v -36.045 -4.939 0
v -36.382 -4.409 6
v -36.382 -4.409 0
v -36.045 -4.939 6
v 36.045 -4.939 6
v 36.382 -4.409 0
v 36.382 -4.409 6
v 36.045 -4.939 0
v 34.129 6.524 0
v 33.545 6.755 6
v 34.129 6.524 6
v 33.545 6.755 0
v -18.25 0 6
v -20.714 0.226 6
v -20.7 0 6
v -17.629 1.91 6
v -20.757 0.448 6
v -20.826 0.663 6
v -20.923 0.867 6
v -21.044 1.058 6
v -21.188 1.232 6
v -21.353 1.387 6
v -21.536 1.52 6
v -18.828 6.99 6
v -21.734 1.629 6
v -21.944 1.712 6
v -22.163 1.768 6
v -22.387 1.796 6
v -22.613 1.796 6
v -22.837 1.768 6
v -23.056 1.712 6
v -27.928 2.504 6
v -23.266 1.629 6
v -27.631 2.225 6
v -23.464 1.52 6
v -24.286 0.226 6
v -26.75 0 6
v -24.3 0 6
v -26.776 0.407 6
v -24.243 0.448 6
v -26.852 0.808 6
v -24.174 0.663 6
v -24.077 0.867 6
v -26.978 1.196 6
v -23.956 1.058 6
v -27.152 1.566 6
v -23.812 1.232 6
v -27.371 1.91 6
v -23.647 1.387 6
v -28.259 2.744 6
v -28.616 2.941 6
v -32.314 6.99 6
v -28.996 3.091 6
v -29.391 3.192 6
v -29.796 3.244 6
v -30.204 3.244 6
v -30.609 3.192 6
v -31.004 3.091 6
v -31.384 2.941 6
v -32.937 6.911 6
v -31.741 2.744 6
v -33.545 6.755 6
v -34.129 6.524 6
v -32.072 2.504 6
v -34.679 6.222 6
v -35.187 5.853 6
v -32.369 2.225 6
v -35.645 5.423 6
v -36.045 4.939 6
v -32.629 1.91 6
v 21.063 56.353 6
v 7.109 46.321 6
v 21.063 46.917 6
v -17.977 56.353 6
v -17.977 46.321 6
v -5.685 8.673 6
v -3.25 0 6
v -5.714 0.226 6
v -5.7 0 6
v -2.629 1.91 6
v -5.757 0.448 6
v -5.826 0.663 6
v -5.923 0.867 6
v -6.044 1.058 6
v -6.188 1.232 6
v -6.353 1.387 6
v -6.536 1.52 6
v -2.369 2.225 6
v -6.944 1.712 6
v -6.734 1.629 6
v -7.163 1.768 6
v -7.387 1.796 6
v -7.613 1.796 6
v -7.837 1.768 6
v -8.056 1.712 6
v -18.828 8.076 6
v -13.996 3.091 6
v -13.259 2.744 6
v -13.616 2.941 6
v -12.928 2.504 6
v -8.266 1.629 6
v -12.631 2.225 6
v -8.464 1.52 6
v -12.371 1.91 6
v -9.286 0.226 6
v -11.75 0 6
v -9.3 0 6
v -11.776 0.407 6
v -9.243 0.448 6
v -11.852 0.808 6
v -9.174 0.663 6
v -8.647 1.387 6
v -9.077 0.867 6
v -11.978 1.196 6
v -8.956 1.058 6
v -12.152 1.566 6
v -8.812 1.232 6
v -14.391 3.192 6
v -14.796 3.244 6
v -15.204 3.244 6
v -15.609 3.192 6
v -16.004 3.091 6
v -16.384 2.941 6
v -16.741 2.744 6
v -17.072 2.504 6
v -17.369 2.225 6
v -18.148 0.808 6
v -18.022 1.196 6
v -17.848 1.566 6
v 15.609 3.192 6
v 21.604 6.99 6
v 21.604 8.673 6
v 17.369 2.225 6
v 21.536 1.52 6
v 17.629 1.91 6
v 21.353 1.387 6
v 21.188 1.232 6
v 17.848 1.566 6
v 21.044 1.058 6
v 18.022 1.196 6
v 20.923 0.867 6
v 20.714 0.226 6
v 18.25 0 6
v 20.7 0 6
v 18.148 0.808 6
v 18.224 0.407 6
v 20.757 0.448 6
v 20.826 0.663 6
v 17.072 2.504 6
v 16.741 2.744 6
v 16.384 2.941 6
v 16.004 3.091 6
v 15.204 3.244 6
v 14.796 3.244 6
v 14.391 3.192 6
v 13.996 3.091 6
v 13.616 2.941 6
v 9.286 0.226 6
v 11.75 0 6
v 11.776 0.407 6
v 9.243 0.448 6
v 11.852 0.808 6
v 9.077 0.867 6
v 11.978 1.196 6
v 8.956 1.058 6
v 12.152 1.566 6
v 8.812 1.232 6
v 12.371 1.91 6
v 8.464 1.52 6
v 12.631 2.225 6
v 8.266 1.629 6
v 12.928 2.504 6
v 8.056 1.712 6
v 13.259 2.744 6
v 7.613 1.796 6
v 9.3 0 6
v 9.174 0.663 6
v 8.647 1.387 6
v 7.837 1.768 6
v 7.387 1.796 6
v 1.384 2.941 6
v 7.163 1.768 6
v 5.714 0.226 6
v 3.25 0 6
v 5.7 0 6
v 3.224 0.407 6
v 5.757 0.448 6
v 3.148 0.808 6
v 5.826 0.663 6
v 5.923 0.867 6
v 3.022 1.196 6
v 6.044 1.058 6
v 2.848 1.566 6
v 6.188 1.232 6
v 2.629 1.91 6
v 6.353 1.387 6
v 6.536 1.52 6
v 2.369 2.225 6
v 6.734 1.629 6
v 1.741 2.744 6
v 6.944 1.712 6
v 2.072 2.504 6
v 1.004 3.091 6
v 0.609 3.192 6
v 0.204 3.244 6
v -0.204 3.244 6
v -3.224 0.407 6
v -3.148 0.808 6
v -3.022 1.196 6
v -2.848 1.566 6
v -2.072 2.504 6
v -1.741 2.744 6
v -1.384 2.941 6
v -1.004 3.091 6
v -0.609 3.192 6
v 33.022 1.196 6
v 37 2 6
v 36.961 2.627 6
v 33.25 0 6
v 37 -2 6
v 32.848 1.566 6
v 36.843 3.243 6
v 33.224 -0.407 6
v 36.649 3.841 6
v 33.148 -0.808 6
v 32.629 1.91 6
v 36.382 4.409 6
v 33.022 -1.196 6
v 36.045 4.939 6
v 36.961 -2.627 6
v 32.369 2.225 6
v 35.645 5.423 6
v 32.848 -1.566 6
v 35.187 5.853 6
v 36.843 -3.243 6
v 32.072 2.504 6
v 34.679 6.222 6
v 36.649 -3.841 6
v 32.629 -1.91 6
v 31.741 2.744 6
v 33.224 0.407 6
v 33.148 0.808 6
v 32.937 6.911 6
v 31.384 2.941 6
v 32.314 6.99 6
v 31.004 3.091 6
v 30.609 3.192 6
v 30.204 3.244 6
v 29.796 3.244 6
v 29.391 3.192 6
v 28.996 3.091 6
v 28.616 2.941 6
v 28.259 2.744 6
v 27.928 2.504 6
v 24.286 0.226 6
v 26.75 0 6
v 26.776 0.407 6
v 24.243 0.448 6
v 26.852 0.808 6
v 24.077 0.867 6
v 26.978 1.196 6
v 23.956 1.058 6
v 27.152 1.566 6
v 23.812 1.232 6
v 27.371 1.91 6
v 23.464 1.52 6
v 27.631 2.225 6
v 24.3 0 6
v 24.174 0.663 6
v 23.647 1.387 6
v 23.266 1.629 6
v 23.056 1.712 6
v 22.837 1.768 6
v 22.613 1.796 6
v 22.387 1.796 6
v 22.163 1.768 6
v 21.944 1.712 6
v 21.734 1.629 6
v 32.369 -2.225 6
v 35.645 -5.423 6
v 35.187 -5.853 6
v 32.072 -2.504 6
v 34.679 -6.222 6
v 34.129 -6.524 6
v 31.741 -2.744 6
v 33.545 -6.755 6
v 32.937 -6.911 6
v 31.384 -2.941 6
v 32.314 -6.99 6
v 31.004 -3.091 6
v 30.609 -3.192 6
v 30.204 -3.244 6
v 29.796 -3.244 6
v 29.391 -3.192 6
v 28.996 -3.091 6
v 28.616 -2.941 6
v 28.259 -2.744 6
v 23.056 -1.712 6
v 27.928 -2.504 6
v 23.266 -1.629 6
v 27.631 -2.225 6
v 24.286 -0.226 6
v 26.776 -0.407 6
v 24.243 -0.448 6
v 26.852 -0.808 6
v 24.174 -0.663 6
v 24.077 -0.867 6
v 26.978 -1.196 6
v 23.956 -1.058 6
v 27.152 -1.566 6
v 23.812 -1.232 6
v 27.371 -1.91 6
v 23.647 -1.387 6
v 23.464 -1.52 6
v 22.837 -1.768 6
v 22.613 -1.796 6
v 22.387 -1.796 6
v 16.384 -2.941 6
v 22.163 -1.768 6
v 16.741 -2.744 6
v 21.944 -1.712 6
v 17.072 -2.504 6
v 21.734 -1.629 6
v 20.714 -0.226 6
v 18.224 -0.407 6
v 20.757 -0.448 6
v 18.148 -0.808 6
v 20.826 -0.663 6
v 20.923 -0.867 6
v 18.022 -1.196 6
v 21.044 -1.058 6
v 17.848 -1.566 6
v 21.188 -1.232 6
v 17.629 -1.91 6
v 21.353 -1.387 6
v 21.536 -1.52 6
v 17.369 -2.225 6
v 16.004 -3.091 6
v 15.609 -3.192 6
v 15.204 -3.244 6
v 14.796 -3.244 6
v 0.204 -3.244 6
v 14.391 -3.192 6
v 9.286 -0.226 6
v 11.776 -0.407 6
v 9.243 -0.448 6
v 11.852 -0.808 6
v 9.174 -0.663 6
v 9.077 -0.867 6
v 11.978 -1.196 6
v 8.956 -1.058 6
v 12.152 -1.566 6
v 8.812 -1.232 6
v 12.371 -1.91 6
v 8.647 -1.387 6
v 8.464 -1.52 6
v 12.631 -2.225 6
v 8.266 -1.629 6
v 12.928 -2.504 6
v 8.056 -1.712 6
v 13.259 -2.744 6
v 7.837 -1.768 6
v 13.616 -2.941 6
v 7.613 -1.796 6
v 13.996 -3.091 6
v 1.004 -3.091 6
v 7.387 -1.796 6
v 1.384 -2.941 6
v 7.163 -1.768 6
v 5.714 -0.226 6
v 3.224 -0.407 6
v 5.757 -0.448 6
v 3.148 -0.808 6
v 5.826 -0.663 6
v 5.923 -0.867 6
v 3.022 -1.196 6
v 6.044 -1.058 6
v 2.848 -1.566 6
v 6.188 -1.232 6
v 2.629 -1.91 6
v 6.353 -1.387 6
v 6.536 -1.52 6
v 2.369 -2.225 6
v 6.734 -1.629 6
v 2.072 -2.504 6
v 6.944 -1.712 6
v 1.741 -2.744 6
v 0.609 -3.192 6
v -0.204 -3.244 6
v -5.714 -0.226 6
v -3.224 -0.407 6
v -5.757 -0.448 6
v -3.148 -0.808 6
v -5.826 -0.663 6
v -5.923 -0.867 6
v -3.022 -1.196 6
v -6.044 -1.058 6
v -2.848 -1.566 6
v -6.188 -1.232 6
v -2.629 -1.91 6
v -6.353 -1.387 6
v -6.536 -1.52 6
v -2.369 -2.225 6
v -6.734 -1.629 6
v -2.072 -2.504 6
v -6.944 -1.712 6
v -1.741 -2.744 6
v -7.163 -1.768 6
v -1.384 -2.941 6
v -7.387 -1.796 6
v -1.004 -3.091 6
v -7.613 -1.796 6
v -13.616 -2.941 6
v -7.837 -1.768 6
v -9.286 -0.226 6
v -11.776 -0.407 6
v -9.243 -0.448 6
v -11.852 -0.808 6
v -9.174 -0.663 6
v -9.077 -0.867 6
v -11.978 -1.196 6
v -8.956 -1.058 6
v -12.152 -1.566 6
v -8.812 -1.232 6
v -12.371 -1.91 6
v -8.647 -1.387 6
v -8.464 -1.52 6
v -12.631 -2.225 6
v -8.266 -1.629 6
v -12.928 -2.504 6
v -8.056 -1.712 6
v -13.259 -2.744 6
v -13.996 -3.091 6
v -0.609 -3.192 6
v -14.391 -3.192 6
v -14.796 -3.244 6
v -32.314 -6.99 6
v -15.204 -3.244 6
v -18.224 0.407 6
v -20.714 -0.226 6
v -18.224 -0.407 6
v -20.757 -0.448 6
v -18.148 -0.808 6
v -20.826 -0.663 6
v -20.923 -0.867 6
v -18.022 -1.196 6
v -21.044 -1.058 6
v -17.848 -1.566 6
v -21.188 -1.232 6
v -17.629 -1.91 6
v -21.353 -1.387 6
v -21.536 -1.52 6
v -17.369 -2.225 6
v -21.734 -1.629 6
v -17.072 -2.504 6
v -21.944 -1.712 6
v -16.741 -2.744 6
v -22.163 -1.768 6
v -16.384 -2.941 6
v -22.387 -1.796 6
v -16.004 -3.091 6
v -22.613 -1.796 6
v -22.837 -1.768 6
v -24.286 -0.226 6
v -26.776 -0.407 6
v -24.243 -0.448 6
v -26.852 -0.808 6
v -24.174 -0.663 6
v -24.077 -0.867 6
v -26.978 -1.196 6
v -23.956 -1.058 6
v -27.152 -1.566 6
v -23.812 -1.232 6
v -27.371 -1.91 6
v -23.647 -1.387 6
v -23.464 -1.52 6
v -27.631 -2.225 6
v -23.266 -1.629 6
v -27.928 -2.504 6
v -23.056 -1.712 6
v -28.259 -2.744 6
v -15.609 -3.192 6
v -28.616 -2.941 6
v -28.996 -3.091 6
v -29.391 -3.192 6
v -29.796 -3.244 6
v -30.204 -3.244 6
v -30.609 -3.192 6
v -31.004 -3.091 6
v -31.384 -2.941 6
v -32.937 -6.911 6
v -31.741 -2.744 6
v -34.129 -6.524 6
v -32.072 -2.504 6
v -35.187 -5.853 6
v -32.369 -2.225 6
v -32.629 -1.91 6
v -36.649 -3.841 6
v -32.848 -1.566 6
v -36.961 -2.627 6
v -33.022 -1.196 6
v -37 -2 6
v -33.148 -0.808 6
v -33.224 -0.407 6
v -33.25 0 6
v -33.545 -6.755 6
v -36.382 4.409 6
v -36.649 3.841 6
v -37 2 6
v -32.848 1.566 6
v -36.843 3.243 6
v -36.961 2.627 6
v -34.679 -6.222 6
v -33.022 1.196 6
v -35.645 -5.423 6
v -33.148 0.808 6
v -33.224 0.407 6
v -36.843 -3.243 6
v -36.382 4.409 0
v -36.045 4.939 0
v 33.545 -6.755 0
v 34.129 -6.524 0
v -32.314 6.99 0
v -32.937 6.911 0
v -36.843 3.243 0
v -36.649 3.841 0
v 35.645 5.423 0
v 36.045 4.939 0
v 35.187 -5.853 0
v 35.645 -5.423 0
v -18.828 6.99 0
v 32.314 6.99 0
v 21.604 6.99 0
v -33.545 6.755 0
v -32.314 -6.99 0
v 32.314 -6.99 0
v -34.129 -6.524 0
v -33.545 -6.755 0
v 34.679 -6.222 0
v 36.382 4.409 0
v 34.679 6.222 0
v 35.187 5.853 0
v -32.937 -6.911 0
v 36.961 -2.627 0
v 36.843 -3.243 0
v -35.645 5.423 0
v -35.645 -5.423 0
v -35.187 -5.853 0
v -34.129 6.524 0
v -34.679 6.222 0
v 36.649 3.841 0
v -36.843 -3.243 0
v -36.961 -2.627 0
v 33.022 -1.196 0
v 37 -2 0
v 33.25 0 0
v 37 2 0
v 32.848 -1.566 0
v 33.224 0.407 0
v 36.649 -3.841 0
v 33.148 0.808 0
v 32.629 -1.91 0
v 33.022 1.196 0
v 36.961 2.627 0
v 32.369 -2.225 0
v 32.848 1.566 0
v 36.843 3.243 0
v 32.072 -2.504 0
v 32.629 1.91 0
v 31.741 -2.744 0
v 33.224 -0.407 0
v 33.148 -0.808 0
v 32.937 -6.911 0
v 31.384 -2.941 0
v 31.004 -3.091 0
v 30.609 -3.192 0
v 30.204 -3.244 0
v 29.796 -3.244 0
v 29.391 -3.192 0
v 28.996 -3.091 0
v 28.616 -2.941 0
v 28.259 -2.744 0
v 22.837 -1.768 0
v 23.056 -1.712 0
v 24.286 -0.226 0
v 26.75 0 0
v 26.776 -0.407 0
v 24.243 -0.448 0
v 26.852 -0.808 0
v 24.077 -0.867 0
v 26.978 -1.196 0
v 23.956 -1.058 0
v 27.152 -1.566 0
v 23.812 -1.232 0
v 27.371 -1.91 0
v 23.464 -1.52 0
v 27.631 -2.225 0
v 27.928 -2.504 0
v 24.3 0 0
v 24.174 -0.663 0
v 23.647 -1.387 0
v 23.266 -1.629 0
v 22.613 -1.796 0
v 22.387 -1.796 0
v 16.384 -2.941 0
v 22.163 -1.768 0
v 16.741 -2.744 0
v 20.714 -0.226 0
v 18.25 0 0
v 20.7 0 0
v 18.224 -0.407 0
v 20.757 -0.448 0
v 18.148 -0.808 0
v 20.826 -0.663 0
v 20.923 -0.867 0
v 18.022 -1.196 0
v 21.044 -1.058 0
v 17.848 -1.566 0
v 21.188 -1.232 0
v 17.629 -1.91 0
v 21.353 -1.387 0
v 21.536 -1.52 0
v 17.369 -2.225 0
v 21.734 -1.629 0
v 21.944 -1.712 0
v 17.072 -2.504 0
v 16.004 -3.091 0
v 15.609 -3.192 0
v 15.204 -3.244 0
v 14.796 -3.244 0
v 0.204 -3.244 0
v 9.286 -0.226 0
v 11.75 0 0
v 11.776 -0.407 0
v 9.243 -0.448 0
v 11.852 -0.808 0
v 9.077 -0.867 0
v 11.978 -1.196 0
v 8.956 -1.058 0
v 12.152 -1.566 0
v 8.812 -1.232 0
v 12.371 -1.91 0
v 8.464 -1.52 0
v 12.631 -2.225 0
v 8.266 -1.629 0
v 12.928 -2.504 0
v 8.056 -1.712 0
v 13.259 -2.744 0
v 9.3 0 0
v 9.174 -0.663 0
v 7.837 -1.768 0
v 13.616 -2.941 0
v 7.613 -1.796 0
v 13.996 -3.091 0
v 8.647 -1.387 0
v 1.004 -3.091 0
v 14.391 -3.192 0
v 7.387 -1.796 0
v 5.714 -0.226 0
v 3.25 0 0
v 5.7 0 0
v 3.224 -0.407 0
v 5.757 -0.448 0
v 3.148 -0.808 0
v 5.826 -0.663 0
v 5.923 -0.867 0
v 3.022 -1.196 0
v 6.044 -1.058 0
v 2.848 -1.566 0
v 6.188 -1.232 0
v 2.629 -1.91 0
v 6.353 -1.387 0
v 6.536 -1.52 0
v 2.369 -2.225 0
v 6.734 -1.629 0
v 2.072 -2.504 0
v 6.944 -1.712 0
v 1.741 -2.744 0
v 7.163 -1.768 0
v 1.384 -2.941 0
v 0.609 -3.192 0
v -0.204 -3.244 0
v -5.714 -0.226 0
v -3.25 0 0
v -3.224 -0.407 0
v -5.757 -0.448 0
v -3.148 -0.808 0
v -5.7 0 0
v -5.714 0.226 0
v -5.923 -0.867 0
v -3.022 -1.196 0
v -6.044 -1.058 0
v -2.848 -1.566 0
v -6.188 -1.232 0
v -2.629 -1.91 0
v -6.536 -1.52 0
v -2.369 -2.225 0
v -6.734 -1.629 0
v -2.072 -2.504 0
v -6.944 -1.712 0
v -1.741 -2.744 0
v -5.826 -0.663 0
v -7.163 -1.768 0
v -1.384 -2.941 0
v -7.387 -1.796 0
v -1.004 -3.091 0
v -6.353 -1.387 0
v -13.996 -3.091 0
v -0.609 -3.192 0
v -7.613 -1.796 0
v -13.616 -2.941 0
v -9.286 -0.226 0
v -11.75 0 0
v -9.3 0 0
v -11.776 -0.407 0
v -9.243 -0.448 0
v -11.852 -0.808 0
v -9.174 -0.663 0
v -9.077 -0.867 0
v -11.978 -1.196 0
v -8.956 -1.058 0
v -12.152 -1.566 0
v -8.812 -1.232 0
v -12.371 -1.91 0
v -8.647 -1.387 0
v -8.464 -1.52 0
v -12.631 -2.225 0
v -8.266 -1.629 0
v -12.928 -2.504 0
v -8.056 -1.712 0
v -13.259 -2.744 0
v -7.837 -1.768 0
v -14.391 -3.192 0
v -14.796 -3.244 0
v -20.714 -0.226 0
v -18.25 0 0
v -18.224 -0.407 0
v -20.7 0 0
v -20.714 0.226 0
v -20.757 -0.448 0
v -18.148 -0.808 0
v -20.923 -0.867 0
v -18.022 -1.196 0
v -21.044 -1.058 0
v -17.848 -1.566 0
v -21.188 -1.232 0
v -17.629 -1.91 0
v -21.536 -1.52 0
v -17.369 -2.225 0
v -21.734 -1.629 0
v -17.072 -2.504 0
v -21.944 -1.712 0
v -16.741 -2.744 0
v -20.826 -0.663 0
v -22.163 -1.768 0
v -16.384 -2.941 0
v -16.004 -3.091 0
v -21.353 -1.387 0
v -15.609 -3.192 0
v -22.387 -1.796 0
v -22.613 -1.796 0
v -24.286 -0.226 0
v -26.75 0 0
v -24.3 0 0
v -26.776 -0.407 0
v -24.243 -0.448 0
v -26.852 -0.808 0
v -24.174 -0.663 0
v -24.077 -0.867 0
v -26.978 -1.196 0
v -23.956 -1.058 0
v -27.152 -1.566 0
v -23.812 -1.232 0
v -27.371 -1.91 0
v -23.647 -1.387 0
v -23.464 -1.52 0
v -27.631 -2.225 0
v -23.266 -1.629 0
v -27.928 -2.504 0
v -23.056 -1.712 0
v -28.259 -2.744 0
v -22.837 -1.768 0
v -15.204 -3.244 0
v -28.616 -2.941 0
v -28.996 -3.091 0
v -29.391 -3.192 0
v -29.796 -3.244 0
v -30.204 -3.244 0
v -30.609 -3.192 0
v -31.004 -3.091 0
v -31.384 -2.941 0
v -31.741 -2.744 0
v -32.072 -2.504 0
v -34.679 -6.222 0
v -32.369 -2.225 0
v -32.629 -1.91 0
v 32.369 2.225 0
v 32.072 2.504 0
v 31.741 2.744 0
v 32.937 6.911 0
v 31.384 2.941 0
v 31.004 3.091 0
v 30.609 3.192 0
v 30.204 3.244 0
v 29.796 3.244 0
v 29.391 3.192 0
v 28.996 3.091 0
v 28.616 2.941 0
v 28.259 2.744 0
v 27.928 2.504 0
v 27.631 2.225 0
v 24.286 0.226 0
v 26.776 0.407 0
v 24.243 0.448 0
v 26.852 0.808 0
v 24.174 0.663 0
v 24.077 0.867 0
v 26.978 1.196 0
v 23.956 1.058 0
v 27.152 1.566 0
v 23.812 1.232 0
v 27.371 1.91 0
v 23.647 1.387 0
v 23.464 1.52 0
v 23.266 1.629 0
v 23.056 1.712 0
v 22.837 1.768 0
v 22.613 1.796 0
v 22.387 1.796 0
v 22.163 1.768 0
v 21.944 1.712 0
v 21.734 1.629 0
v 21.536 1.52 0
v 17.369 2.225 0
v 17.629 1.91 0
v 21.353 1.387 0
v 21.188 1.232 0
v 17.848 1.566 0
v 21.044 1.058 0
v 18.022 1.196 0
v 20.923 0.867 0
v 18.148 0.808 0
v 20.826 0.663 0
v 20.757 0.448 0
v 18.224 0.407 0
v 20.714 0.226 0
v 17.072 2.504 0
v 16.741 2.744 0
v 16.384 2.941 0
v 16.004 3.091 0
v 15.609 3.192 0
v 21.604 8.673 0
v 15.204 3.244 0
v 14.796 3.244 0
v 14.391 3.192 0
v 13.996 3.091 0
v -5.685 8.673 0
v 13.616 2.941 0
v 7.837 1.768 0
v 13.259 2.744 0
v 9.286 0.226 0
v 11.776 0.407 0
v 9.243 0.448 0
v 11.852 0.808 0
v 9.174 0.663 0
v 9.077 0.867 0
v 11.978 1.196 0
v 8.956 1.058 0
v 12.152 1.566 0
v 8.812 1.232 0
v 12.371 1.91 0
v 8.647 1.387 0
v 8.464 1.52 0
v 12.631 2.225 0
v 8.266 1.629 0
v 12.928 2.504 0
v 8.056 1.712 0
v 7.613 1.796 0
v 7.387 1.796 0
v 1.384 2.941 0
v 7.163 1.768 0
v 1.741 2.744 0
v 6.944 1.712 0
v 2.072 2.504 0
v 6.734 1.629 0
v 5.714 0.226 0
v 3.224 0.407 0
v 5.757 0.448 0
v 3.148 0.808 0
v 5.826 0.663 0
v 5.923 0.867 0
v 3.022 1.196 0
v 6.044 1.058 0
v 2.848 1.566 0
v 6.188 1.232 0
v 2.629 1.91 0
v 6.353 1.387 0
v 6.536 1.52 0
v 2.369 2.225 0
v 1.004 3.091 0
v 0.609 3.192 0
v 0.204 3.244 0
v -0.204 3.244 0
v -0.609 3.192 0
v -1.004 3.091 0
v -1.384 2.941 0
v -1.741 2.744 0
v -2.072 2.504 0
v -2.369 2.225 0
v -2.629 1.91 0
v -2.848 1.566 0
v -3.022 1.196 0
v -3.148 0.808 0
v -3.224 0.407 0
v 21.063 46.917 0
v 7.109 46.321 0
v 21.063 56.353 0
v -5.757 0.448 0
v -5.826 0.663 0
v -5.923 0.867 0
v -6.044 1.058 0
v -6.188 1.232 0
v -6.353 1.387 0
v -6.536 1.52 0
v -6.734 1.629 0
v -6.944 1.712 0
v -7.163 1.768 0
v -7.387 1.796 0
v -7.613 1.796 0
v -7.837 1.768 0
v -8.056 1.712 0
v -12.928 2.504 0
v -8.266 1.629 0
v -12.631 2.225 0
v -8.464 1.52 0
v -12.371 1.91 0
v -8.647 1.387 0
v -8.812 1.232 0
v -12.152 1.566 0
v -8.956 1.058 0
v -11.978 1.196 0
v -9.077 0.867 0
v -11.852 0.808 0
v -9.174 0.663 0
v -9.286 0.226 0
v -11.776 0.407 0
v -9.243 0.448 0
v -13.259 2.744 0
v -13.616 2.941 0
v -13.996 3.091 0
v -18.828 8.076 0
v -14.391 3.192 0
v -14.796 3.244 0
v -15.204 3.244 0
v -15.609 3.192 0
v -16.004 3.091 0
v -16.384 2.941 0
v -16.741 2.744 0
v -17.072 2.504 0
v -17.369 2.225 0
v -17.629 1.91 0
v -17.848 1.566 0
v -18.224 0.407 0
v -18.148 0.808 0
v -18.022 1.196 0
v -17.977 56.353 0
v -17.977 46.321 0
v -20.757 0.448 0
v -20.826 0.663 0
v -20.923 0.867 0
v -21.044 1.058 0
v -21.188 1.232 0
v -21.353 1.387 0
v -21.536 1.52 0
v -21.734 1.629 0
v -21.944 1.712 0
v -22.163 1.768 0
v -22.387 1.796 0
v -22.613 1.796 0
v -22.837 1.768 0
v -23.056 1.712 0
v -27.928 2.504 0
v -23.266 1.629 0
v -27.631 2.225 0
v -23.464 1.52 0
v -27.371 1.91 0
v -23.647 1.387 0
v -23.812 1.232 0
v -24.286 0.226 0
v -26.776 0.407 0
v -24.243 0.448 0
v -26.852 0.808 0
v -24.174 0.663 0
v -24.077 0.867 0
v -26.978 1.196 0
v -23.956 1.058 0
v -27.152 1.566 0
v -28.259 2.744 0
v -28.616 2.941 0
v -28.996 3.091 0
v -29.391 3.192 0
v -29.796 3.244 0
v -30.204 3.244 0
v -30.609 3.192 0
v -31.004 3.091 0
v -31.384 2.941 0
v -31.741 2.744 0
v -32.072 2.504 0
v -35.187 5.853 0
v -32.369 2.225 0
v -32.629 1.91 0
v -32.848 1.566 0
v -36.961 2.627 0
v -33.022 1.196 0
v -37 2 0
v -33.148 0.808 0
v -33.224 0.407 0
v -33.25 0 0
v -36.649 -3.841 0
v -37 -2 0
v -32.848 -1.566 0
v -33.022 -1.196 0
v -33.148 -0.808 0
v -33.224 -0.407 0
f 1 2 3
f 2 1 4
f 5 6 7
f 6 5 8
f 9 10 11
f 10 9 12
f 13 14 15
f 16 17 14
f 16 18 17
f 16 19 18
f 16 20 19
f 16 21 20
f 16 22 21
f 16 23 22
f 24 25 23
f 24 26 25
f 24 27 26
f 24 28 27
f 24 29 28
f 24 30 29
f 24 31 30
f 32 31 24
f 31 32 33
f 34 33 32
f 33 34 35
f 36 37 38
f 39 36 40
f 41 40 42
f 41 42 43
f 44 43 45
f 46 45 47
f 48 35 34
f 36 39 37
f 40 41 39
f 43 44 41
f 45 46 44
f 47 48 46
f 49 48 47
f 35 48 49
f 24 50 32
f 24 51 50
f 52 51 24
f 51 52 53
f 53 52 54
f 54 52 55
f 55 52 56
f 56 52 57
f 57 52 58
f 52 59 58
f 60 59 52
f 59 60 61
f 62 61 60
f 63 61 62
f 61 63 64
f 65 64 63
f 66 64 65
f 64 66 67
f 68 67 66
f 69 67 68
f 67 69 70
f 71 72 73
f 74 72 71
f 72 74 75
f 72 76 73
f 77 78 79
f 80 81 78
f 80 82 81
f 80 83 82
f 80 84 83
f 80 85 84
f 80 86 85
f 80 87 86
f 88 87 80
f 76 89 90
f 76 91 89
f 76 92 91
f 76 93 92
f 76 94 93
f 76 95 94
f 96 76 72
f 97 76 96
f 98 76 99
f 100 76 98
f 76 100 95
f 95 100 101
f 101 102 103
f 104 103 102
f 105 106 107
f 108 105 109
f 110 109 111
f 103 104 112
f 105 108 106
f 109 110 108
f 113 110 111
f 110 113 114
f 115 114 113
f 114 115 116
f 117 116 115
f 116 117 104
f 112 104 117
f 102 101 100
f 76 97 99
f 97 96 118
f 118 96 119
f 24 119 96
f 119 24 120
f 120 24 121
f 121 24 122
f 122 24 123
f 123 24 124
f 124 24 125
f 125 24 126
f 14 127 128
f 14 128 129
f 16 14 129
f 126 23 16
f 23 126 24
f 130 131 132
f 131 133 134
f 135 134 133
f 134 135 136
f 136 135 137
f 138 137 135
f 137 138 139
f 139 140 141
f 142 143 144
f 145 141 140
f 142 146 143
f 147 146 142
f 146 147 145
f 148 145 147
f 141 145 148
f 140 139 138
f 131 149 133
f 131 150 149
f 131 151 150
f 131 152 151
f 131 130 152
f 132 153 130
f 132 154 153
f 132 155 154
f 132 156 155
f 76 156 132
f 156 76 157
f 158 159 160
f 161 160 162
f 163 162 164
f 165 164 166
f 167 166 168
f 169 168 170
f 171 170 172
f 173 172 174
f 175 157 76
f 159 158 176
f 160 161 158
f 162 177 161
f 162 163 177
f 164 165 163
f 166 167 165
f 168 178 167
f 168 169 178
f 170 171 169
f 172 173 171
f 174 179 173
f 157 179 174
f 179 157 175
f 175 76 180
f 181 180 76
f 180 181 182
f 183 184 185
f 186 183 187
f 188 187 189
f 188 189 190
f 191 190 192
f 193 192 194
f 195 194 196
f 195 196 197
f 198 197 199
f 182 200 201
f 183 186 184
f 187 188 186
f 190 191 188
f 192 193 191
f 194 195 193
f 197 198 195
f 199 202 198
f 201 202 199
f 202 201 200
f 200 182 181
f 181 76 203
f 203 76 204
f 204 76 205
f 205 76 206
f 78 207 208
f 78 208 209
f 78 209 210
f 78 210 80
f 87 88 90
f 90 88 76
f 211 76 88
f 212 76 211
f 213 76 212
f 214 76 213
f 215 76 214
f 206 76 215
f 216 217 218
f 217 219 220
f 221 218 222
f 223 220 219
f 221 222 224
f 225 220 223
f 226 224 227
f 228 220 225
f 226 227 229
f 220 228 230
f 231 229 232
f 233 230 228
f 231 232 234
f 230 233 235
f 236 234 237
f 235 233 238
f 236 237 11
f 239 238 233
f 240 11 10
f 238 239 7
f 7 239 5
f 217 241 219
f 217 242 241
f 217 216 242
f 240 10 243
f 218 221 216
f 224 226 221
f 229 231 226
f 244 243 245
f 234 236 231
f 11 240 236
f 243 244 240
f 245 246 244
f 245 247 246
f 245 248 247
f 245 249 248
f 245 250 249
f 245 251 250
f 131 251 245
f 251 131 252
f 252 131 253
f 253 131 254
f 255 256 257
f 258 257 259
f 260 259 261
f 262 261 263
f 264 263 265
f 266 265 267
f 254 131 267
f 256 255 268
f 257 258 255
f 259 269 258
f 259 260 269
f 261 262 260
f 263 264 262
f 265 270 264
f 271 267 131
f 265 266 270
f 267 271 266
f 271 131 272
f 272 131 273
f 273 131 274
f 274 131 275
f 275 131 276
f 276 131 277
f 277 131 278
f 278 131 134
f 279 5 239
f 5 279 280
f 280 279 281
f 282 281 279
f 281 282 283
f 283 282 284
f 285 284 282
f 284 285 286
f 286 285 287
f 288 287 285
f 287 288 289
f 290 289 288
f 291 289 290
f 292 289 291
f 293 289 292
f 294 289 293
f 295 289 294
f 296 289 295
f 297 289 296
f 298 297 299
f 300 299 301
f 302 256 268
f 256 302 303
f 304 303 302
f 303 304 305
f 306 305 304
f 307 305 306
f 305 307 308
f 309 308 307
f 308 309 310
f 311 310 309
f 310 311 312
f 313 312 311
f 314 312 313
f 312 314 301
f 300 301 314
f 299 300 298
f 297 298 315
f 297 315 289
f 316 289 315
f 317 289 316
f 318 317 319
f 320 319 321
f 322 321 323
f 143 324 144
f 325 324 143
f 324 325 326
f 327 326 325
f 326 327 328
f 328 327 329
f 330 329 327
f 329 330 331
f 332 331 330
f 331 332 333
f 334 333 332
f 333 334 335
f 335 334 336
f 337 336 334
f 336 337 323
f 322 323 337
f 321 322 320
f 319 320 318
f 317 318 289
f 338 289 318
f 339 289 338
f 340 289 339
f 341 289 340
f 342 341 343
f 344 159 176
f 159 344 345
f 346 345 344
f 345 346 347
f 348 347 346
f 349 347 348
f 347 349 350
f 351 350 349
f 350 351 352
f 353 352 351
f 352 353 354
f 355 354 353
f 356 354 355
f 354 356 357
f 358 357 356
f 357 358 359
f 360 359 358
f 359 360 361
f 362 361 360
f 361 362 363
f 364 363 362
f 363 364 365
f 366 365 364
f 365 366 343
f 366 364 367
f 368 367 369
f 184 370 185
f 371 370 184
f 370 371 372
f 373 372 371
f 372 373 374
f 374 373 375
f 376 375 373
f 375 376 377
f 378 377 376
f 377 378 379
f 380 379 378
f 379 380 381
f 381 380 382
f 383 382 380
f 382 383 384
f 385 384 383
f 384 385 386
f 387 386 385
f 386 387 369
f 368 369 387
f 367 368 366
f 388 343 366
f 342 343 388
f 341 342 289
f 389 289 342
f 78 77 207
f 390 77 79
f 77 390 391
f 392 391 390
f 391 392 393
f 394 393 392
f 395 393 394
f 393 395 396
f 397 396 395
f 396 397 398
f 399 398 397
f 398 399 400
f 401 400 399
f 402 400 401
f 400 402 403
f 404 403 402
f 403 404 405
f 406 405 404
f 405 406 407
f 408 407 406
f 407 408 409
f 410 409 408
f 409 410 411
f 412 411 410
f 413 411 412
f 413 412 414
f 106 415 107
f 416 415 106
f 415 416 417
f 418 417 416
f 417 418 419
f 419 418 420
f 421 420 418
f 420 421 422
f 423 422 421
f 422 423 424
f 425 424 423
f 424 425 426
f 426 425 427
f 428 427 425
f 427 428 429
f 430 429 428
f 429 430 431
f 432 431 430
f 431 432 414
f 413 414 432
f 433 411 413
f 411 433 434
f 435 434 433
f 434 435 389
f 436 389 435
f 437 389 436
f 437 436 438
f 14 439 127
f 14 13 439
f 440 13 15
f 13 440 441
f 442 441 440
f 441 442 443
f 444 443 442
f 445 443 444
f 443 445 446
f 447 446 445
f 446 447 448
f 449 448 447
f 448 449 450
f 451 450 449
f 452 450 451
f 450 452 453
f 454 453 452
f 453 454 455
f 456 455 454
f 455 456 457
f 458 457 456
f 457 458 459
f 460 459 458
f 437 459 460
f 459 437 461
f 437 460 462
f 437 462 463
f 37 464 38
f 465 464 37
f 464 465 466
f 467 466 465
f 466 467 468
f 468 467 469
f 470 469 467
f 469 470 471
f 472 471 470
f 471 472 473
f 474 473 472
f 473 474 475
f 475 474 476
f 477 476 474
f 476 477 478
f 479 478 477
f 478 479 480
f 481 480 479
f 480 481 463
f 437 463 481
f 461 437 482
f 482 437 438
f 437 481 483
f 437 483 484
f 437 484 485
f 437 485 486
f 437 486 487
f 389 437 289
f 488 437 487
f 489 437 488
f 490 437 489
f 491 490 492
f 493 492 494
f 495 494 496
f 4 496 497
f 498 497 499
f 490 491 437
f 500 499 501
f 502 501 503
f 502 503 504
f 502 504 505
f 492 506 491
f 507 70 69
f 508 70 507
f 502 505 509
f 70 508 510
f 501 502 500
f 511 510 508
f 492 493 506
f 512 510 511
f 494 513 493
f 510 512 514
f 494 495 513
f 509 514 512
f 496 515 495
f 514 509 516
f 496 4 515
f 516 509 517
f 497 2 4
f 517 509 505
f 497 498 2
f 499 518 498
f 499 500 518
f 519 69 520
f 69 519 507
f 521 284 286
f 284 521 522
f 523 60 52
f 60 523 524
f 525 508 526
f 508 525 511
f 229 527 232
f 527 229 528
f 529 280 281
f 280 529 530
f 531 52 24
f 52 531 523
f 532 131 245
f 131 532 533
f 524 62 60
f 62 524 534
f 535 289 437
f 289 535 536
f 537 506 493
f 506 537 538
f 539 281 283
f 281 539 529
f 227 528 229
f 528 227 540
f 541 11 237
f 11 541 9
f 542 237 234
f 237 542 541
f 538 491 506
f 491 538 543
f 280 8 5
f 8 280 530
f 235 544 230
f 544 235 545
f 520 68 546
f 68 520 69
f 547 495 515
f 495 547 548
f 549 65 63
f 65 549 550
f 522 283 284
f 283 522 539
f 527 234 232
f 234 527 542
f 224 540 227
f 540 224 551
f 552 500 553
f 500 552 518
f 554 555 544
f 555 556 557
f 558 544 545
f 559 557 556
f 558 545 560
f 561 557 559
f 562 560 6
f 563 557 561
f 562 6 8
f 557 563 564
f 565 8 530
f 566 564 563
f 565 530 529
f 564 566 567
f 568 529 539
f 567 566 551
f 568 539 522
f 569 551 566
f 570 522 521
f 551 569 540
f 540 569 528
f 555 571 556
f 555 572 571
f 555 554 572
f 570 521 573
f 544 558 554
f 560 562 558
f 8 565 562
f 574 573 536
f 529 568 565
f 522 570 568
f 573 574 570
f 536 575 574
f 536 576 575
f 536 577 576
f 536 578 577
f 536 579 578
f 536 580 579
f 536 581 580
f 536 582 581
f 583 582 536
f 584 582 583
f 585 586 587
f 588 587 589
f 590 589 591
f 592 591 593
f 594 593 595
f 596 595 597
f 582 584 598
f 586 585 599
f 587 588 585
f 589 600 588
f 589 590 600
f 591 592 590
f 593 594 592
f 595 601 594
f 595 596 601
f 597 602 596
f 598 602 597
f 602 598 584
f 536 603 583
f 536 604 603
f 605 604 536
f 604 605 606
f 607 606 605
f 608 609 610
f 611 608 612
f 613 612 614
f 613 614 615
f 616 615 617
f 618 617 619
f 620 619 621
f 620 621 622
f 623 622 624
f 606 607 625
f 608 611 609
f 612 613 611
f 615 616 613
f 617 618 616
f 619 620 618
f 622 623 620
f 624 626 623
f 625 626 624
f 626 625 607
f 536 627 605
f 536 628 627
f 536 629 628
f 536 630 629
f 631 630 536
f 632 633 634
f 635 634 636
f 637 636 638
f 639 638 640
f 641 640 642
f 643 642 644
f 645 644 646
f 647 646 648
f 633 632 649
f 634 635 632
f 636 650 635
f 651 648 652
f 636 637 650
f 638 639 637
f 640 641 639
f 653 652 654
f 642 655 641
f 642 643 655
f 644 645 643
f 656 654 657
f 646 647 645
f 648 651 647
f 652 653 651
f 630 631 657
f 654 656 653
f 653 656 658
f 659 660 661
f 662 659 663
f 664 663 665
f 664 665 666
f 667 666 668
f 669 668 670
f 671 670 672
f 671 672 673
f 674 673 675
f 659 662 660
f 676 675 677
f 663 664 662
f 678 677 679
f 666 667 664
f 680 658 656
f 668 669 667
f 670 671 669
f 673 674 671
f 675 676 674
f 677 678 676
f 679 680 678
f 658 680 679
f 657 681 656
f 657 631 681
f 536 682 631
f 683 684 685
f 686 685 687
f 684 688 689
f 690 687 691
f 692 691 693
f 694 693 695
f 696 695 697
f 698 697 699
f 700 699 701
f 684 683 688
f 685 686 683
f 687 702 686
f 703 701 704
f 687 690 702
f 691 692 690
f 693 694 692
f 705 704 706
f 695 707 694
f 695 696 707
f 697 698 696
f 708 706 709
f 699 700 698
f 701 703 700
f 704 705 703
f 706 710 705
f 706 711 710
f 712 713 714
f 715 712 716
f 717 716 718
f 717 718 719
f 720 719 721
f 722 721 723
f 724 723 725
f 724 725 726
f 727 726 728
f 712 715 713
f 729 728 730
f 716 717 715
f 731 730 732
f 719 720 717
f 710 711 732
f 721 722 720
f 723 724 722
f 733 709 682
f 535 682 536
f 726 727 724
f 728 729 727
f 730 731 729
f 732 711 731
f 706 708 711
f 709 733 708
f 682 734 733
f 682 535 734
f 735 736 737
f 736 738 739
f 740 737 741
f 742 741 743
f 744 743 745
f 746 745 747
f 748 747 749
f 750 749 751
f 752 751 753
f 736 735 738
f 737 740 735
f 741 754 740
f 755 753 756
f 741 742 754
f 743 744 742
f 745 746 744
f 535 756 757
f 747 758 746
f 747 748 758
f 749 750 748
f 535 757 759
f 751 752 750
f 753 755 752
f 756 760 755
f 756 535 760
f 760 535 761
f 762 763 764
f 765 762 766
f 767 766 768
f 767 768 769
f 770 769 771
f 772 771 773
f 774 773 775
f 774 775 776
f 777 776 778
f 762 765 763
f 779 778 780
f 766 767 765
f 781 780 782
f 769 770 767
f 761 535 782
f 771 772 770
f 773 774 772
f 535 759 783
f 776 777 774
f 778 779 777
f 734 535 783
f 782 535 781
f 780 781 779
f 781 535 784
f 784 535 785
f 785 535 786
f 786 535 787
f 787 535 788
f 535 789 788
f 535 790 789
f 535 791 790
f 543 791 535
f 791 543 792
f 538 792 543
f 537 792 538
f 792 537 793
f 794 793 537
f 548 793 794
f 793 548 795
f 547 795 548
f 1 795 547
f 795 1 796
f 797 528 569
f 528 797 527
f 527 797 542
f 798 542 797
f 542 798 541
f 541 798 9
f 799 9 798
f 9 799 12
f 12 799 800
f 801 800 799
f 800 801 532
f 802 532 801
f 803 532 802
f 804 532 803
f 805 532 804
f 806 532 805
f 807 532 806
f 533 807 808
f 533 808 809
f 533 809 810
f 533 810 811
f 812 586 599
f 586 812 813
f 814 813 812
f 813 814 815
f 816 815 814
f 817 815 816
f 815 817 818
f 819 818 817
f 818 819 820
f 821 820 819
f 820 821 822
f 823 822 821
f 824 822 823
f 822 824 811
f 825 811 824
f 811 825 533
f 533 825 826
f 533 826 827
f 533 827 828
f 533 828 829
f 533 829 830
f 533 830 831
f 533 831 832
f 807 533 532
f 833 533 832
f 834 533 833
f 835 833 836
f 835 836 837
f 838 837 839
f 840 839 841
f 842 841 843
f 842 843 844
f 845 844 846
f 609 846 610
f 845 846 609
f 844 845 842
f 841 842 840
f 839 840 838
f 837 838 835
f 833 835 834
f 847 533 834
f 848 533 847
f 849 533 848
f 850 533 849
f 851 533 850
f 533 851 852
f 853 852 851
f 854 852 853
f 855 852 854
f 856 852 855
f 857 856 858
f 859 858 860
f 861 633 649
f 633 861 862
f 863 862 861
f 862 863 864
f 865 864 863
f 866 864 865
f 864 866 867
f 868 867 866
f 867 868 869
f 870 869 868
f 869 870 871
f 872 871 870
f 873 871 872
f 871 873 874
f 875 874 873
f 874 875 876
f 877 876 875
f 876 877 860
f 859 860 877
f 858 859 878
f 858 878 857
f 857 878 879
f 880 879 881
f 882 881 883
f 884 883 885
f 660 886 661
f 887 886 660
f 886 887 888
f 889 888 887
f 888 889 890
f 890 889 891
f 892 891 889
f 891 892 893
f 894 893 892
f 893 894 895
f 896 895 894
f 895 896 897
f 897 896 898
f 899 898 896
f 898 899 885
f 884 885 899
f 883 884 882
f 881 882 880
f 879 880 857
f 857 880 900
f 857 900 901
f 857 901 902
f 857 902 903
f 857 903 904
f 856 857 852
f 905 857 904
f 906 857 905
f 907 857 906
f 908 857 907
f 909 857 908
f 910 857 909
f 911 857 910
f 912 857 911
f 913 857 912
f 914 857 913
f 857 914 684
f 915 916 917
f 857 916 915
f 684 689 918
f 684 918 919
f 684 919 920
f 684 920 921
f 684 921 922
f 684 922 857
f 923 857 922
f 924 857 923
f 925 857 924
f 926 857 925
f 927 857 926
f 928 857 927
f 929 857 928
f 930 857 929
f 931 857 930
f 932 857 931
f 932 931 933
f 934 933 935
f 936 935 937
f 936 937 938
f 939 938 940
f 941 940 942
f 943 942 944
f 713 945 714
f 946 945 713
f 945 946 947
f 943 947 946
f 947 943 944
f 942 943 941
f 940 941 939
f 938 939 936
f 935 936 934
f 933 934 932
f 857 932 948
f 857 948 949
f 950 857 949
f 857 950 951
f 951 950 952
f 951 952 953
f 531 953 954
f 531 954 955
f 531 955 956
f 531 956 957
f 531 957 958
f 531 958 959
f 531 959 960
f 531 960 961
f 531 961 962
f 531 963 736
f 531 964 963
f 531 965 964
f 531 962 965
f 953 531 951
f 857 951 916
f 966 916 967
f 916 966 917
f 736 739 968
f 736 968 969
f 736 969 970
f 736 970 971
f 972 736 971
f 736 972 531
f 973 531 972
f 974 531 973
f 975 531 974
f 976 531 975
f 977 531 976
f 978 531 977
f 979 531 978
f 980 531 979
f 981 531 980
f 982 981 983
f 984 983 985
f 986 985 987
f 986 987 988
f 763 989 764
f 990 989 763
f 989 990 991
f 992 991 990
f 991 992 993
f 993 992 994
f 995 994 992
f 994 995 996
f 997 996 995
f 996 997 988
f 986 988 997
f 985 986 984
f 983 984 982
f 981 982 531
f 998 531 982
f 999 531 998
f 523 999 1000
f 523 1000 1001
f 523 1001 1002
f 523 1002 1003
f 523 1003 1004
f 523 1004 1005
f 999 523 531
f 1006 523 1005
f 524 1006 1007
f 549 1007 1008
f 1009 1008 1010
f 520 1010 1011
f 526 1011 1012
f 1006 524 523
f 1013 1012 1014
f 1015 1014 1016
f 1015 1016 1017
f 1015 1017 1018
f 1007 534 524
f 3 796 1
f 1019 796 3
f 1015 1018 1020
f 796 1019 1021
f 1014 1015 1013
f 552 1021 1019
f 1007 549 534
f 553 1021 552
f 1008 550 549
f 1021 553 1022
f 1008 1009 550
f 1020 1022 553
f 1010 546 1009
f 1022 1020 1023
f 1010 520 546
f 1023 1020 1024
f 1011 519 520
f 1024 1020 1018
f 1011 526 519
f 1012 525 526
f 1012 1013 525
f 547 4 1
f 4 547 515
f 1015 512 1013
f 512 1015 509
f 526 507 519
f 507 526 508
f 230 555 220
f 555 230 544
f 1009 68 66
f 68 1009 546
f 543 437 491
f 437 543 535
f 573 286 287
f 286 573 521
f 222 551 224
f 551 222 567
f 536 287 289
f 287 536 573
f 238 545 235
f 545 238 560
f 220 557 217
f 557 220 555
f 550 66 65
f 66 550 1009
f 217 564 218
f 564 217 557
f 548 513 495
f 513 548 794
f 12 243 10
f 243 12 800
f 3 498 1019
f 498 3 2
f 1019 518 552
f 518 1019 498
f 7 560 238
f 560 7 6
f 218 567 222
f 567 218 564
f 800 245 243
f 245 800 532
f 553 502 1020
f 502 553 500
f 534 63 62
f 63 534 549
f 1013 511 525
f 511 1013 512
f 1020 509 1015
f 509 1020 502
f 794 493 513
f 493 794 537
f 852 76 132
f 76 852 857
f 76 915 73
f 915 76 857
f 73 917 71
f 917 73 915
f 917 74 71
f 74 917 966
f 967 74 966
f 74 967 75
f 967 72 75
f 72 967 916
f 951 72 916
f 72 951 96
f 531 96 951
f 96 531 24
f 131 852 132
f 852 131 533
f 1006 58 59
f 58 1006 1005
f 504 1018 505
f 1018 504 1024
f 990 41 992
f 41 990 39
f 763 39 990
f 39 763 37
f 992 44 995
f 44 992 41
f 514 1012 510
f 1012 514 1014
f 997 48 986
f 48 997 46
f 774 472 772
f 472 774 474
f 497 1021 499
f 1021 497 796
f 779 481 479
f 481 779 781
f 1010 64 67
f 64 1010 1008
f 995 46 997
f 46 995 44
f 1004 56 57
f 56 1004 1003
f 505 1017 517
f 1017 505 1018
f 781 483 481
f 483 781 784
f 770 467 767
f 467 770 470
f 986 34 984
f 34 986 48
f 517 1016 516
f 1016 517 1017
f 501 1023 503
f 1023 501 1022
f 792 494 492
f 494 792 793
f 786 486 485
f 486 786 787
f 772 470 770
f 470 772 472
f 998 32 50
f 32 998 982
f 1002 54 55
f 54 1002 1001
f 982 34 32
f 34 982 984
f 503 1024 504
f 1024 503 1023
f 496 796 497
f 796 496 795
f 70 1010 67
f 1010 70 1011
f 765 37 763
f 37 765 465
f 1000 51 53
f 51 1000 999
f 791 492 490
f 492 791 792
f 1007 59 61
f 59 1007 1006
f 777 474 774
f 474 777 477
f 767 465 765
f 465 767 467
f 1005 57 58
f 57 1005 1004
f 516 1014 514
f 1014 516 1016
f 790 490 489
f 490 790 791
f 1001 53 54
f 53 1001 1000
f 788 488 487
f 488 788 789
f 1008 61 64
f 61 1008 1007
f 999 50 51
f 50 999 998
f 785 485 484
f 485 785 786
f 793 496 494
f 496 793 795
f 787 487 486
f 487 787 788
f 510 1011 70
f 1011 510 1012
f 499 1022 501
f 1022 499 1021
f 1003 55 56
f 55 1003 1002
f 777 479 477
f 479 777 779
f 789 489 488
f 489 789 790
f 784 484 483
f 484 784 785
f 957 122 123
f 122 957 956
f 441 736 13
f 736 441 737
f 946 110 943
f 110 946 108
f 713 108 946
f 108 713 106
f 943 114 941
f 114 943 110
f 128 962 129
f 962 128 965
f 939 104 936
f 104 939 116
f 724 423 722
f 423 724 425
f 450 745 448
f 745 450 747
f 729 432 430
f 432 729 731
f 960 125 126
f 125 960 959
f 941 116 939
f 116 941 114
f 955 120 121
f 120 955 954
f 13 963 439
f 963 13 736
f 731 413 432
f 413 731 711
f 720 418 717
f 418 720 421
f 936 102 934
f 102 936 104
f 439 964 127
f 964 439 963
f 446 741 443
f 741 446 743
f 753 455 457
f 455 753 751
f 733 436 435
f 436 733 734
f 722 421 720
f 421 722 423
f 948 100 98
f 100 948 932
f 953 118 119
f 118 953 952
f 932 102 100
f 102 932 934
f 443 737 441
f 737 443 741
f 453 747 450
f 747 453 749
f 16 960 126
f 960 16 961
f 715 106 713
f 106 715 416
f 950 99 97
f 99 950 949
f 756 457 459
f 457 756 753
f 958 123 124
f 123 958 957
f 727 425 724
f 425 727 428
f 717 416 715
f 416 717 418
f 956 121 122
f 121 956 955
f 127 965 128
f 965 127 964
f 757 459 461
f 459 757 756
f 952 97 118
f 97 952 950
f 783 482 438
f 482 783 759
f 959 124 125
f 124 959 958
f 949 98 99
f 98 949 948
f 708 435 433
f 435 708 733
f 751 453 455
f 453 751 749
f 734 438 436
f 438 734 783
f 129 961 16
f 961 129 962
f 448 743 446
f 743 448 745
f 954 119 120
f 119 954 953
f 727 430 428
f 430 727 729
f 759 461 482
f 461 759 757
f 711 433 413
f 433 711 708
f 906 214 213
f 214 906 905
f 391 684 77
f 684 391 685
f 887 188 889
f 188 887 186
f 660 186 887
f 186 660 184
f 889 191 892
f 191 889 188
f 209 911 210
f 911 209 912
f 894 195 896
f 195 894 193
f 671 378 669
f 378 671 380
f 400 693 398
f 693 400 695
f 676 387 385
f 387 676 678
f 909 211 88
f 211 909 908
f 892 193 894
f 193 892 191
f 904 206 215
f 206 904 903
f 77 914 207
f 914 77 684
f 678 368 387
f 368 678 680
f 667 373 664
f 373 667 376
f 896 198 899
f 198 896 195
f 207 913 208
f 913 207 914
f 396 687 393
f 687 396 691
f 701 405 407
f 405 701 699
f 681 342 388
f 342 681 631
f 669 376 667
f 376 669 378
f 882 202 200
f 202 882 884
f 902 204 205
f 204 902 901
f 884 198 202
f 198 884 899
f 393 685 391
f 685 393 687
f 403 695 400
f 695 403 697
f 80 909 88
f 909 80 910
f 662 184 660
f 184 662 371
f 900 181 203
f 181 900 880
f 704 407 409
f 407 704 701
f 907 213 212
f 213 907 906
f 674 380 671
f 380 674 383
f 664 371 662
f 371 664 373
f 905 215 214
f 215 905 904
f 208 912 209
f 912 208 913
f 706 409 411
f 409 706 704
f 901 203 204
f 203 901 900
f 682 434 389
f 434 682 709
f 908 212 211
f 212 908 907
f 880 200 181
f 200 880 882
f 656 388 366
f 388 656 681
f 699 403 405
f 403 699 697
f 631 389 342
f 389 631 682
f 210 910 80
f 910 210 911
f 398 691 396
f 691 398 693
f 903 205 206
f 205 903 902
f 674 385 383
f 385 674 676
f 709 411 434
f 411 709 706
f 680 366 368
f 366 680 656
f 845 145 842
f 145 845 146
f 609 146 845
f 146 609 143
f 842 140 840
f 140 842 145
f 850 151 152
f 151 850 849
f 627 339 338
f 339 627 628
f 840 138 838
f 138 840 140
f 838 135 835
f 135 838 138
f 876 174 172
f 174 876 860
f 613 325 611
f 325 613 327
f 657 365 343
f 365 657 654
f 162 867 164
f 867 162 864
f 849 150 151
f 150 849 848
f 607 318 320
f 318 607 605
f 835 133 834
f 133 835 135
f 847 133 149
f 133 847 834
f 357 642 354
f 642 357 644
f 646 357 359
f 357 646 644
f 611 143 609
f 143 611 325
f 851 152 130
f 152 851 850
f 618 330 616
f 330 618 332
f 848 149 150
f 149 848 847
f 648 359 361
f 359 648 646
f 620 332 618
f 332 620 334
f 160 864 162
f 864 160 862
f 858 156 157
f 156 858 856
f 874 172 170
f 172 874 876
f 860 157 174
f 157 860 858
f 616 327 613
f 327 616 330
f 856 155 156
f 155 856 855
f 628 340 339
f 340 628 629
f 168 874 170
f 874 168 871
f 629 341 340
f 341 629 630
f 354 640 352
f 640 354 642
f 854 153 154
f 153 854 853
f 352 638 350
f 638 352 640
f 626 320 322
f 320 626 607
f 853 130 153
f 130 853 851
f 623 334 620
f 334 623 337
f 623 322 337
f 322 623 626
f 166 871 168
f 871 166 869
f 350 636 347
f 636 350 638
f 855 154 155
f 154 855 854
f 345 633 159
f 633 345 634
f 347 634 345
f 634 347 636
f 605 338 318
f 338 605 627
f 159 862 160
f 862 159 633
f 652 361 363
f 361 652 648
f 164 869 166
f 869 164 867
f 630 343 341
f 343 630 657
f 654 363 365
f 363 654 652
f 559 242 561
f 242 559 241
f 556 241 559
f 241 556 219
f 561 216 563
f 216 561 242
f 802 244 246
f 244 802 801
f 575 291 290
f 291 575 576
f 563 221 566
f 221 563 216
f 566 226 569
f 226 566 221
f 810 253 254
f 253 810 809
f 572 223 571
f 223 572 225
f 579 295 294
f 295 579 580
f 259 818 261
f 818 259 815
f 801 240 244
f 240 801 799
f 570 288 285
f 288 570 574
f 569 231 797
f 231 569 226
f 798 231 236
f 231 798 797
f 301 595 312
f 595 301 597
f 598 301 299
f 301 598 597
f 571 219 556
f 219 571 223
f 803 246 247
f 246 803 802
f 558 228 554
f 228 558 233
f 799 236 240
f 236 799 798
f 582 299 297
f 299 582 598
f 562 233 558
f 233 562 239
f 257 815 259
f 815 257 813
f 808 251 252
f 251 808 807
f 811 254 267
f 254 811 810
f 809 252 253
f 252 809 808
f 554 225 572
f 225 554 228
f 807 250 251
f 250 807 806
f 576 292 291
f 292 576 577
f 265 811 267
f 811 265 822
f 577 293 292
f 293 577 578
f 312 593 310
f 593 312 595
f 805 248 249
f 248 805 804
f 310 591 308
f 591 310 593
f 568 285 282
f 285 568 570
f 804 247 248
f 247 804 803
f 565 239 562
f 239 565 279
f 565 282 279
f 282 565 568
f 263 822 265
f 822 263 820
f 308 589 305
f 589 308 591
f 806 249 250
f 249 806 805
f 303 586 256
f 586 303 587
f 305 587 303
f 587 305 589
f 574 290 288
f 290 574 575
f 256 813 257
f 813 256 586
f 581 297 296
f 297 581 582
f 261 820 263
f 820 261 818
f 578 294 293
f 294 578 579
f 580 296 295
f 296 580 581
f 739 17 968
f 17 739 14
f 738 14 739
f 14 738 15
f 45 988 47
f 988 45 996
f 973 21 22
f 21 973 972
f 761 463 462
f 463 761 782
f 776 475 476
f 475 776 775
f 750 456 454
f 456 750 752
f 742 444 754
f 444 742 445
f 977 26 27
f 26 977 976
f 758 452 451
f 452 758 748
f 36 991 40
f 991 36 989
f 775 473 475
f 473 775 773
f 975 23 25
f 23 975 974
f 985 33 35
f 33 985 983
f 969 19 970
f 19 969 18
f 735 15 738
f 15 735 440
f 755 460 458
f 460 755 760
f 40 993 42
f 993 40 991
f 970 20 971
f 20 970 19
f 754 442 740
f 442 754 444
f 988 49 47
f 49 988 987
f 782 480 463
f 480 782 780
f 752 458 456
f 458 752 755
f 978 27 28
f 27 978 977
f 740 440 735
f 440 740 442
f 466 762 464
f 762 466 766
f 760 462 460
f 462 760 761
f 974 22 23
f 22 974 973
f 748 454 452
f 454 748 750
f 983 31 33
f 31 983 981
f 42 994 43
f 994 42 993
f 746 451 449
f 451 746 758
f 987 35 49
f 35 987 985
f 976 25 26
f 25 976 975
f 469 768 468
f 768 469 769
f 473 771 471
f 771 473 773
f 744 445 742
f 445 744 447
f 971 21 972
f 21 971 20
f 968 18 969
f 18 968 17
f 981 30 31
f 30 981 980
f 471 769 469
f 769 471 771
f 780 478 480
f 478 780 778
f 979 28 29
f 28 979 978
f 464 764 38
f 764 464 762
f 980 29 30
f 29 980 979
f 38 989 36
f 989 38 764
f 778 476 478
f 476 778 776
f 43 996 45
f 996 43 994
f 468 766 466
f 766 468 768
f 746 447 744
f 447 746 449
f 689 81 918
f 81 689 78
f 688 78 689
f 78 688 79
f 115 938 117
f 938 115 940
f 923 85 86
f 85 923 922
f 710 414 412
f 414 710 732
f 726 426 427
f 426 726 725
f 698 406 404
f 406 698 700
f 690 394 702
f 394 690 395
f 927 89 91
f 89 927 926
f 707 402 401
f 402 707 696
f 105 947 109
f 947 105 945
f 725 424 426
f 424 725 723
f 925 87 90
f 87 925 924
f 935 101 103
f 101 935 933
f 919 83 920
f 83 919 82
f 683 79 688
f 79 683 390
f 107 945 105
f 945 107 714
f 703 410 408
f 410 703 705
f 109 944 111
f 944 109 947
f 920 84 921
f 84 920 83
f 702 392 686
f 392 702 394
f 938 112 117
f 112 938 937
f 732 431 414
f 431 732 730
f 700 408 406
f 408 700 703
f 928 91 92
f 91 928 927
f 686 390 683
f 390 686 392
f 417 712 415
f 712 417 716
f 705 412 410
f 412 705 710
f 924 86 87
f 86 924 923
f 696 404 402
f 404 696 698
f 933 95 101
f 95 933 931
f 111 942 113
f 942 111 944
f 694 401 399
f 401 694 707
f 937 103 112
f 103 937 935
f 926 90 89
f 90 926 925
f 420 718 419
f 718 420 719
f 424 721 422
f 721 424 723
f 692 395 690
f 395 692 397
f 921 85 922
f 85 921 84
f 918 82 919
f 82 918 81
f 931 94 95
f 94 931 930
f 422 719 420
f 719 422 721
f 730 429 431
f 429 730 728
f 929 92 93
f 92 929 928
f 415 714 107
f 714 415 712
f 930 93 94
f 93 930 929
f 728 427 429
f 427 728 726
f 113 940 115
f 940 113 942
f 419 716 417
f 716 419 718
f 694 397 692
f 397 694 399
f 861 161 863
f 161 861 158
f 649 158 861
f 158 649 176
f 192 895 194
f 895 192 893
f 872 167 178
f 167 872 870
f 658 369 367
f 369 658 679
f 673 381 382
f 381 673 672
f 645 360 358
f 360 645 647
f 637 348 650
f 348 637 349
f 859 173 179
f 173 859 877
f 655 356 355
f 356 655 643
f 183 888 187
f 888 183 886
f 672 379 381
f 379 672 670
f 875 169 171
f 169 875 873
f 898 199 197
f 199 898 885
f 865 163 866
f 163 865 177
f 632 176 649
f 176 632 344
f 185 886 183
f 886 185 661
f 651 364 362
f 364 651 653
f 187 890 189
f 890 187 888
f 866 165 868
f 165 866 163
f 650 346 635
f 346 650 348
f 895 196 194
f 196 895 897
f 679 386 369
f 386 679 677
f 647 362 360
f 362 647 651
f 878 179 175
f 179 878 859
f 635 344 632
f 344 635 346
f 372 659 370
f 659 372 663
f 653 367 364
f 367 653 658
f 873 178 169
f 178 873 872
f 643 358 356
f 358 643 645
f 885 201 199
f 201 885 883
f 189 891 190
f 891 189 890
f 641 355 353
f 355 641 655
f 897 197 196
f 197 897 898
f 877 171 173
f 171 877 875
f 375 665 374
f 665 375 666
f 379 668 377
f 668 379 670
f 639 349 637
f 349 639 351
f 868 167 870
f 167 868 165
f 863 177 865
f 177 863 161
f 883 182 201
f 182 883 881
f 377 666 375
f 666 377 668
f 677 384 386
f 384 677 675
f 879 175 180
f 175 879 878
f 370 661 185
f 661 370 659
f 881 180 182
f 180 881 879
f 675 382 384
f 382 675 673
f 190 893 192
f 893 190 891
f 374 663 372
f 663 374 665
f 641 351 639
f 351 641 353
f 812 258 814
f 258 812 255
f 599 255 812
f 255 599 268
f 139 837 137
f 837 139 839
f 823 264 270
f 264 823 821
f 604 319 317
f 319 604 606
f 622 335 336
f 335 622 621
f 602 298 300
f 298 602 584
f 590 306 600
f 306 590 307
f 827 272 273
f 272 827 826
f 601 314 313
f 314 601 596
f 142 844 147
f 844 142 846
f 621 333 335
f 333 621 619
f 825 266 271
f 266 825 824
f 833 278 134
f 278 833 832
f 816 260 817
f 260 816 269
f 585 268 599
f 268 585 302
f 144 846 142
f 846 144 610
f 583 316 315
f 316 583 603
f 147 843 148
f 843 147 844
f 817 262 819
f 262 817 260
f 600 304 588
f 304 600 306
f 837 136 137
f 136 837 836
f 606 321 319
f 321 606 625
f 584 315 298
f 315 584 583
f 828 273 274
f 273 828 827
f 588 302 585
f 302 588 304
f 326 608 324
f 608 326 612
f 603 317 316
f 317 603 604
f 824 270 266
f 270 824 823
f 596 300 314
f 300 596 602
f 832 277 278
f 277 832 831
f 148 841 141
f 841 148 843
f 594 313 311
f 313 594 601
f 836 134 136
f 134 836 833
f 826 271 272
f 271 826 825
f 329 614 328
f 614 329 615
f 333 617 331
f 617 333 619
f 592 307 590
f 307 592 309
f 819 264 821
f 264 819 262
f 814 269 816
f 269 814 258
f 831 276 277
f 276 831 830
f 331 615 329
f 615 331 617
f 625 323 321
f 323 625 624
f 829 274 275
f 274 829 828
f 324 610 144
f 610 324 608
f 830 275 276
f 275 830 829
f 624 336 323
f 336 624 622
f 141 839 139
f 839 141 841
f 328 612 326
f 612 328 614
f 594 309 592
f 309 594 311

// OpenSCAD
$fn = 50;


difference() {
	union() {
		hull() {
			translate(v = [-32.0000000000, 2.0000000000, 0]) {
				cylinder(h = 6, r = 5);
			}
			translate(v = [32.0000000000, 2.0000000000, 0]) {
				cylinder(h = 6, r = 5);
			}
			translate(v = [-32.0000000000, -2.0000000000, 0]) {
				cylinder(h = 6, r = 5);
			}
			translate(v = [32.0000000000, -2.0000000000, 0]) {
				cylinder(h = 6, r = 5);
			}
		}
		translate(v = [0, 55, 0]) {
			linear_extrude(height = 6) {
				text(font = "DejaVu Sans Mono:style=Bold", halign = "center", size = 57.0000000000, text = "Z", valign = "top");
			}
		}
	}
	union() {
		translate(v = [-30.0000000000, 0.0000000000, 0]) {
			translate(v = [0, 0, -100]) {
				cylinder(h = 200, r = 3.2500000000);
			}
		}
		translate(v = [-15.0000000000, 0.0000000000, 0]) {
			translate(v = [0, 0, -100]) {
				cylinder(h = 200, r = 3.2500000000);
			}
		}
		translate(v = [0, 0, -100]) {
			cylinder(h = 200, r = 3.2500000000);
		}
		translate(v = [15.0000000000, 0.0000000000, 0]) {
			translate(v = [0, 0, -100]) {
				cylinder(h = 200, r = 3.2500000000);
			}
		}
		translate(v = [30.0000000000, 0.0000000000, 0]) {
			translate(v = [0, 0, -100]) {
				cylinder(h = 200, r = 3.2500000000);
			}
		}
		translate(v = [-30.0000000000, 0.0000000000, 0]) {
			translate(v = [0, 0, -100]) {
				cylinder(h = 200, r = 1.8000000000);
			}
		}
		translate(v = [-22.5000000000, 0.0000000000, 0]) {
			translate(v = [0, 0, -100]) {
				cylinder(h = 200, r = 1.8000000000);
			}
		}
		translate(v = [-15.0000000000, 0.0000000000, 0]) {
			translate(v = [0, 0, -100]) {
				cylinder(h = 200, r = 1.8000000000);
			}
		}
		translate(v = [-7.5000000000, 0.0000000000, 0]) {
			translate(v = [0, 0, -100]) {
				cylinder(h = 200, r = 1.8000000000);
			}
		}
		translate(v = [0, 0, -100]) {
			cylinder(h = 200, r = 1.8000000000);
		}
		translate(v = [7.5000000000, 0.0000000000, 0]) {
			translate(v = [0, 0, -100]) {
				cylinder(h = 200, r = 1.8000000000);
			}
		}
		translate(v = [15.0000000000, 0.0000000000, 0]) {
			translate(v = [0, 0, -100]) {
				cylinder(h = 200, r = 1.8000000000);
			}
		}
		translate(v = [22.5000000000, 0.0000000000, 0]) {
			translate(v = [0, 0, -100]) {
				cylinder(h = 200, r = 1.8000000000);
			}
		}
		translate(v = [30.0000000000, 0.0000000000, 0]) {
			translate(v = [0, 0, -100]) {
				cylinder(h = 200, r = 1.8000000000);
			}
		}
	}
}
